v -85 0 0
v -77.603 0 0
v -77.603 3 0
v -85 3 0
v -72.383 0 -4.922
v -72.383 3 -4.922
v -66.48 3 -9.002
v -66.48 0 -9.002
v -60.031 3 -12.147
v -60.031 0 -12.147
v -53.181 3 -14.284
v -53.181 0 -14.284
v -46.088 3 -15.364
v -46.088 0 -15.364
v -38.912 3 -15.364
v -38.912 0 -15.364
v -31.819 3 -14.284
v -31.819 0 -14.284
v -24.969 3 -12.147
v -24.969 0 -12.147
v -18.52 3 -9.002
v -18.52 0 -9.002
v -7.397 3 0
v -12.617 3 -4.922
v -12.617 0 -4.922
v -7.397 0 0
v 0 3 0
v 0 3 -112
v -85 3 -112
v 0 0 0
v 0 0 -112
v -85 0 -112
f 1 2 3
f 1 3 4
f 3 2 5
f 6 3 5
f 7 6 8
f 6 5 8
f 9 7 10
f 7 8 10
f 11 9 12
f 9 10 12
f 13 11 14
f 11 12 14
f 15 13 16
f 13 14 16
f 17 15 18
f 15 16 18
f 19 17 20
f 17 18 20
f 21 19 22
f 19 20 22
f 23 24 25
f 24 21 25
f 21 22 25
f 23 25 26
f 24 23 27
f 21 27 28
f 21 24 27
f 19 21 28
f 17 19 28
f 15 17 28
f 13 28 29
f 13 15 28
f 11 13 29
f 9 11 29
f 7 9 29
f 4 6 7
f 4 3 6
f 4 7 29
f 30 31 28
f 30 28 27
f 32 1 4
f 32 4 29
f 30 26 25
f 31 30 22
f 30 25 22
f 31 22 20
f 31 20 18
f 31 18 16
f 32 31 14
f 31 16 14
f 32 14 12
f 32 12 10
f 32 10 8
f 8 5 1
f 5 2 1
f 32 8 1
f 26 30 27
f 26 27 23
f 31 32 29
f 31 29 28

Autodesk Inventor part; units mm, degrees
ref_plane "YZ Plane" through (0, 0, 0) normal (1, 0, 0) x (0, 1, 0)
ref_plane "XZ Plane" through (0, 0, 0) normal (0, 1, 0) x (-1, 0, 0)
ref_plane "XY Plane" through (0, 0, 0) normal (0, 0, 1) x (1, 0, 0)
sketch "Sketch1" plane through (0, 0, 0) normal (0, 1, 0) x (-1, 0, 0)
  line L0 (85, 0) -> (85, -112)
  line L1 (85, -112) -> (0, -112)
  line L2 (0, -112) -> (0, 0)
  arc A0 (7.3966, 0) -> (77.6034, 0) centre (42.5, 32) ccw
  line L3 (0, 0) -> (7.3966, 0)
  line L4 (77.6034, 0) -> (85, 0)
  dimension "d0" = 112
  dimension "d1" = 85
extrude "Extrusion1" add sketch "Sketch1" along normal blind 3
properties part number "Electronics Plate"
